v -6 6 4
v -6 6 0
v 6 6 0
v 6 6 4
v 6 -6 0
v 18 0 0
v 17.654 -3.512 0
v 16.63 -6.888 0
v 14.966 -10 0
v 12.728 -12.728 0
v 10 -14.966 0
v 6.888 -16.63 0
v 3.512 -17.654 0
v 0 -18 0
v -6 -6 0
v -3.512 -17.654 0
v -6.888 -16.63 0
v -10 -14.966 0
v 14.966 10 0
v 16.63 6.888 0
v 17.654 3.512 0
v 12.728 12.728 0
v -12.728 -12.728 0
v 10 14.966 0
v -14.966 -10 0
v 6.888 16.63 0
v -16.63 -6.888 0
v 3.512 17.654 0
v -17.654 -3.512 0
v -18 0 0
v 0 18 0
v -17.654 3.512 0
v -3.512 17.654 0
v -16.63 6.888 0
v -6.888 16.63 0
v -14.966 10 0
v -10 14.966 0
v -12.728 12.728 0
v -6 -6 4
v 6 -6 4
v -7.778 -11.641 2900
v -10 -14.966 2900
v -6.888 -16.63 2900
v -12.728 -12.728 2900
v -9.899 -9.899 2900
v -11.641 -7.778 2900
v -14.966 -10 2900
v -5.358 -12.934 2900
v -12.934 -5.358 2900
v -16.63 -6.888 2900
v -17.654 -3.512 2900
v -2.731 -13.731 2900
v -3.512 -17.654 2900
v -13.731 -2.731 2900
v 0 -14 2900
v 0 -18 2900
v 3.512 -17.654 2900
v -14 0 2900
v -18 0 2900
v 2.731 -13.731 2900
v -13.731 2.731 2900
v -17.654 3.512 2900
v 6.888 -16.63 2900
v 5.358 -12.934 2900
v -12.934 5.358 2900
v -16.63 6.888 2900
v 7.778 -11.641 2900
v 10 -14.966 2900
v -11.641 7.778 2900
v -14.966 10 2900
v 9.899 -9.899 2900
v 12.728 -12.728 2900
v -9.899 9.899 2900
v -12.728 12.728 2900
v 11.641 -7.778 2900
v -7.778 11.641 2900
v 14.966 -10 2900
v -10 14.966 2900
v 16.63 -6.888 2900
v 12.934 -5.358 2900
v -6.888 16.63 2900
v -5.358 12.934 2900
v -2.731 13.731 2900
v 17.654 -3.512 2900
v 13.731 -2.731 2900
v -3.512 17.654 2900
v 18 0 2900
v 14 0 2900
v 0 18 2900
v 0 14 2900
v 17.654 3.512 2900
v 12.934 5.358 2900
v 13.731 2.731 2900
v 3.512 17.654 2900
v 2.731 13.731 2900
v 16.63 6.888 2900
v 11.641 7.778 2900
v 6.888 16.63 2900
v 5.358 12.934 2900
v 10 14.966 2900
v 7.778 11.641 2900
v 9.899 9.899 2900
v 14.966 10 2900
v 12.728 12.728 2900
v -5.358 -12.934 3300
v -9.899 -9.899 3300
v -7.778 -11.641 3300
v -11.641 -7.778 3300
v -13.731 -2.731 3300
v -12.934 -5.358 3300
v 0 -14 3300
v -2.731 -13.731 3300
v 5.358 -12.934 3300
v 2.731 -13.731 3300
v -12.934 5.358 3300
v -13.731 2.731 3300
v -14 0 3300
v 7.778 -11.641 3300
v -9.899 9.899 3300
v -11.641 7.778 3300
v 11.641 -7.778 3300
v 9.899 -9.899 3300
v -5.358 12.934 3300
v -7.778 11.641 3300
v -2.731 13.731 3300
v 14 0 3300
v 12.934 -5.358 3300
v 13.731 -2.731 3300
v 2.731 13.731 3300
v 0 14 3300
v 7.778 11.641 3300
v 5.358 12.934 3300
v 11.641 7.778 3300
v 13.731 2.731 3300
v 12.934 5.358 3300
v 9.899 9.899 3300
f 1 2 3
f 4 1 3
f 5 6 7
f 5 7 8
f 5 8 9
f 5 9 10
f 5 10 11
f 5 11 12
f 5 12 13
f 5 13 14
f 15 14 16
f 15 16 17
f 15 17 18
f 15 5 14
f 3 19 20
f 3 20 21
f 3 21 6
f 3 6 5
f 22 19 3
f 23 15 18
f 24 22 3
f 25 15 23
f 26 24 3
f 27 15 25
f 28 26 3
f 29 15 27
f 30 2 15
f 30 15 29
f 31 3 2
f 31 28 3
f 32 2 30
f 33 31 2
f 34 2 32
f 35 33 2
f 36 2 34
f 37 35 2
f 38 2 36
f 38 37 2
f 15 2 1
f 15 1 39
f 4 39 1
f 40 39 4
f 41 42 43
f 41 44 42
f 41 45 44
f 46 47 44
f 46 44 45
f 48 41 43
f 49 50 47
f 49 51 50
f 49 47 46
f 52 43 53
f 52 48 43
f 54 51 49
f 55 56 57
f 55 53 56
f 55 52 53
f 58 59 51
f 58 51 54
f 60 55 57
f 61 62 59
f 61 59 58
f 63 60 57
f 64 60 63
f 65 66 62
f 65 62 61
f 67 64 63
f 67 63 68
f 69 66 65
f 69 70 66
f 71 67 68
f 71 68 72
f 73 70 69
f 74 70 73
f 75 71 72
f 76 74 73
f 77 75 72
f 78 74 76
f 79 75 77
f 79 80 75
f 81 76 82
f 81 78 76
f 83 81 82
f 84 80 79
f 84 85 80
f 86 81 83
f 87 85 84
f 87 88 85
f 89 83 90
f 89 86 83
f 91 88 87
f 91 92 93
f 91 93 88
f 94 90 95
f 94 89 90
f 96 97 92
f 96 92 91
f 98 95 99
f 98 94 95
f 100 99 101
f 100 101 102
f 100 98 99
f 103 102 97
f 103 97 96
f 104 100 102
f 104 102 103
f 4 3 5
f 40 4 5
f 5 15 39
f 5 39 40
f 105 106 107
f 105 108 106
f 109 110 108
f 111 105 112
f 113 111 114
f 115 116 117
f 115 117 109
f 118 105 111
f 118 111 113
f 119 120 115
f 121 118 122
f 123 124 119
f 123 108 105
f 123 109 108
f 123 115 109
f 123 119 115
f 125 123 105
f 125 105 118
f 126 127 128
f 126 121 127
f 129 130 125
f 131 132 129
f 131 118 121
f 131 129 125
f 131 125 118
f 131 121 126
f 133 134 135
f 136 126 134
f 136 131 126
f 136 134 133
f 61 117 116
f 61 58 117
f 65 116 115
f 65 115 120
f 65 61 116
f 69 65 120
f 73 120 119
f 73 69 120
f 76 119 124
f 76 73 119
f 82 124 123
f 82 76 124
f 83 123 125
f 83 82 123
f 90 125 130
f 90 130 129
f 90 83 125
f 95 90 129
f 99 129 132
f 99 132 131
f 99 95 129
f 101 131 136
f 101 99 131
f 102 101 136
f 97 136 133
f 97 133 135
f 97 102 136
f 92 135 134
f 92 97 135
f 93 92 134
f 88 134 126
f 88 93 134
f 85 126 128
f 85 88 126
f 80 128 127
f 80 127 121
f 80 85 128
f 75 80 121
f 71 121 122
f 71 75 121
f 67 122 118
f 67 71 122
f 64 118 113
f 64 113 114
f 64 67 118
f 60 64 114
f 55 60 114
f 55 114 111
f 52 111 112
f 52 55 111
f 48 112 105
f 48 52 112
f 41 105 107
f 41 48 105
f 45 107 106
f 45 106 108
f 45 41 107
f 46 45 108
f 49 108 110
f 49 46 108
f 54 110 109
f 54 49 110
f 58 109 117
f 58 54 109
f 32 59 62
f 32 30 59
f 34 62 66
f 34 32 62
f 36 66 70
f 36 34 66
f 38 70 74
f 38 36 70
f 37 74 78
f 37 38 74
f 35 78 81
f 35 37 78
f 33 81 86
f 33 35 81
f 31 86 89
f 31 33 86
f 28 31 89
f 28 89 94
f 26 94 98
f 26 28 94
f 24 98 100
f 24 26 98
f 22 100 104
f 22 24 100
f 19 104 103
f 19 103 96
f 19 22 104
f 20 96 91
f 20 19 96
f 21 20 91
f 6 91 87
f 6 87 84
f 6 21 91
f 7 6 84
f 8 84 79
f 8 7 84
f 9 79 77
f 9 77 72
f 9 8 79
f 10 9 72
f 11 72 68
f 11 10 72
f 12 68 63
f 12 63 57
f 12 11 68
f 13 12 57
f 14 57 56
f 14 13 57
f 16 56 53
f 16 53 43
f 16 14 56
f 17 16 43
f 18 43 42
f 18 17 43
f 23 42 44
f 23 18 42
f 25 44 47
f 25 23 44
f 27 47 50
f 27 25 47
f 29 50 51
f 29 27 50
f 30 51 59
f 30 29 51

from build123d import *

# Parameters (mm, degrees)
F2_W     = 12
F2_H     = 12
F3_DEPTH = 4


with BuildPart() as f1:
    # F0 (on Front) → F1 (revolve)
    with BuildSketch(Plane.XZ):
        Polygon((0, 0), (0, 3300), (-14, 3300), (-14, 2900), (-18, 2900), (-18, 0), align=None)
    revolve(axis=Axis((0, 0, 1650), (0, 0, -1)))

    # F2 (on face) → F3 (cut)
    with BuildSketch(Plane(origin=(0, 0, 0), x_dir=(1, 0, 0), z_dir=(0, 0, -1))):
        Rectangle(F2_W, F2_H)
    extrude(amount=-F3_DEPTH, mode=Mode.SUBTRACT)


solid = f1.part
